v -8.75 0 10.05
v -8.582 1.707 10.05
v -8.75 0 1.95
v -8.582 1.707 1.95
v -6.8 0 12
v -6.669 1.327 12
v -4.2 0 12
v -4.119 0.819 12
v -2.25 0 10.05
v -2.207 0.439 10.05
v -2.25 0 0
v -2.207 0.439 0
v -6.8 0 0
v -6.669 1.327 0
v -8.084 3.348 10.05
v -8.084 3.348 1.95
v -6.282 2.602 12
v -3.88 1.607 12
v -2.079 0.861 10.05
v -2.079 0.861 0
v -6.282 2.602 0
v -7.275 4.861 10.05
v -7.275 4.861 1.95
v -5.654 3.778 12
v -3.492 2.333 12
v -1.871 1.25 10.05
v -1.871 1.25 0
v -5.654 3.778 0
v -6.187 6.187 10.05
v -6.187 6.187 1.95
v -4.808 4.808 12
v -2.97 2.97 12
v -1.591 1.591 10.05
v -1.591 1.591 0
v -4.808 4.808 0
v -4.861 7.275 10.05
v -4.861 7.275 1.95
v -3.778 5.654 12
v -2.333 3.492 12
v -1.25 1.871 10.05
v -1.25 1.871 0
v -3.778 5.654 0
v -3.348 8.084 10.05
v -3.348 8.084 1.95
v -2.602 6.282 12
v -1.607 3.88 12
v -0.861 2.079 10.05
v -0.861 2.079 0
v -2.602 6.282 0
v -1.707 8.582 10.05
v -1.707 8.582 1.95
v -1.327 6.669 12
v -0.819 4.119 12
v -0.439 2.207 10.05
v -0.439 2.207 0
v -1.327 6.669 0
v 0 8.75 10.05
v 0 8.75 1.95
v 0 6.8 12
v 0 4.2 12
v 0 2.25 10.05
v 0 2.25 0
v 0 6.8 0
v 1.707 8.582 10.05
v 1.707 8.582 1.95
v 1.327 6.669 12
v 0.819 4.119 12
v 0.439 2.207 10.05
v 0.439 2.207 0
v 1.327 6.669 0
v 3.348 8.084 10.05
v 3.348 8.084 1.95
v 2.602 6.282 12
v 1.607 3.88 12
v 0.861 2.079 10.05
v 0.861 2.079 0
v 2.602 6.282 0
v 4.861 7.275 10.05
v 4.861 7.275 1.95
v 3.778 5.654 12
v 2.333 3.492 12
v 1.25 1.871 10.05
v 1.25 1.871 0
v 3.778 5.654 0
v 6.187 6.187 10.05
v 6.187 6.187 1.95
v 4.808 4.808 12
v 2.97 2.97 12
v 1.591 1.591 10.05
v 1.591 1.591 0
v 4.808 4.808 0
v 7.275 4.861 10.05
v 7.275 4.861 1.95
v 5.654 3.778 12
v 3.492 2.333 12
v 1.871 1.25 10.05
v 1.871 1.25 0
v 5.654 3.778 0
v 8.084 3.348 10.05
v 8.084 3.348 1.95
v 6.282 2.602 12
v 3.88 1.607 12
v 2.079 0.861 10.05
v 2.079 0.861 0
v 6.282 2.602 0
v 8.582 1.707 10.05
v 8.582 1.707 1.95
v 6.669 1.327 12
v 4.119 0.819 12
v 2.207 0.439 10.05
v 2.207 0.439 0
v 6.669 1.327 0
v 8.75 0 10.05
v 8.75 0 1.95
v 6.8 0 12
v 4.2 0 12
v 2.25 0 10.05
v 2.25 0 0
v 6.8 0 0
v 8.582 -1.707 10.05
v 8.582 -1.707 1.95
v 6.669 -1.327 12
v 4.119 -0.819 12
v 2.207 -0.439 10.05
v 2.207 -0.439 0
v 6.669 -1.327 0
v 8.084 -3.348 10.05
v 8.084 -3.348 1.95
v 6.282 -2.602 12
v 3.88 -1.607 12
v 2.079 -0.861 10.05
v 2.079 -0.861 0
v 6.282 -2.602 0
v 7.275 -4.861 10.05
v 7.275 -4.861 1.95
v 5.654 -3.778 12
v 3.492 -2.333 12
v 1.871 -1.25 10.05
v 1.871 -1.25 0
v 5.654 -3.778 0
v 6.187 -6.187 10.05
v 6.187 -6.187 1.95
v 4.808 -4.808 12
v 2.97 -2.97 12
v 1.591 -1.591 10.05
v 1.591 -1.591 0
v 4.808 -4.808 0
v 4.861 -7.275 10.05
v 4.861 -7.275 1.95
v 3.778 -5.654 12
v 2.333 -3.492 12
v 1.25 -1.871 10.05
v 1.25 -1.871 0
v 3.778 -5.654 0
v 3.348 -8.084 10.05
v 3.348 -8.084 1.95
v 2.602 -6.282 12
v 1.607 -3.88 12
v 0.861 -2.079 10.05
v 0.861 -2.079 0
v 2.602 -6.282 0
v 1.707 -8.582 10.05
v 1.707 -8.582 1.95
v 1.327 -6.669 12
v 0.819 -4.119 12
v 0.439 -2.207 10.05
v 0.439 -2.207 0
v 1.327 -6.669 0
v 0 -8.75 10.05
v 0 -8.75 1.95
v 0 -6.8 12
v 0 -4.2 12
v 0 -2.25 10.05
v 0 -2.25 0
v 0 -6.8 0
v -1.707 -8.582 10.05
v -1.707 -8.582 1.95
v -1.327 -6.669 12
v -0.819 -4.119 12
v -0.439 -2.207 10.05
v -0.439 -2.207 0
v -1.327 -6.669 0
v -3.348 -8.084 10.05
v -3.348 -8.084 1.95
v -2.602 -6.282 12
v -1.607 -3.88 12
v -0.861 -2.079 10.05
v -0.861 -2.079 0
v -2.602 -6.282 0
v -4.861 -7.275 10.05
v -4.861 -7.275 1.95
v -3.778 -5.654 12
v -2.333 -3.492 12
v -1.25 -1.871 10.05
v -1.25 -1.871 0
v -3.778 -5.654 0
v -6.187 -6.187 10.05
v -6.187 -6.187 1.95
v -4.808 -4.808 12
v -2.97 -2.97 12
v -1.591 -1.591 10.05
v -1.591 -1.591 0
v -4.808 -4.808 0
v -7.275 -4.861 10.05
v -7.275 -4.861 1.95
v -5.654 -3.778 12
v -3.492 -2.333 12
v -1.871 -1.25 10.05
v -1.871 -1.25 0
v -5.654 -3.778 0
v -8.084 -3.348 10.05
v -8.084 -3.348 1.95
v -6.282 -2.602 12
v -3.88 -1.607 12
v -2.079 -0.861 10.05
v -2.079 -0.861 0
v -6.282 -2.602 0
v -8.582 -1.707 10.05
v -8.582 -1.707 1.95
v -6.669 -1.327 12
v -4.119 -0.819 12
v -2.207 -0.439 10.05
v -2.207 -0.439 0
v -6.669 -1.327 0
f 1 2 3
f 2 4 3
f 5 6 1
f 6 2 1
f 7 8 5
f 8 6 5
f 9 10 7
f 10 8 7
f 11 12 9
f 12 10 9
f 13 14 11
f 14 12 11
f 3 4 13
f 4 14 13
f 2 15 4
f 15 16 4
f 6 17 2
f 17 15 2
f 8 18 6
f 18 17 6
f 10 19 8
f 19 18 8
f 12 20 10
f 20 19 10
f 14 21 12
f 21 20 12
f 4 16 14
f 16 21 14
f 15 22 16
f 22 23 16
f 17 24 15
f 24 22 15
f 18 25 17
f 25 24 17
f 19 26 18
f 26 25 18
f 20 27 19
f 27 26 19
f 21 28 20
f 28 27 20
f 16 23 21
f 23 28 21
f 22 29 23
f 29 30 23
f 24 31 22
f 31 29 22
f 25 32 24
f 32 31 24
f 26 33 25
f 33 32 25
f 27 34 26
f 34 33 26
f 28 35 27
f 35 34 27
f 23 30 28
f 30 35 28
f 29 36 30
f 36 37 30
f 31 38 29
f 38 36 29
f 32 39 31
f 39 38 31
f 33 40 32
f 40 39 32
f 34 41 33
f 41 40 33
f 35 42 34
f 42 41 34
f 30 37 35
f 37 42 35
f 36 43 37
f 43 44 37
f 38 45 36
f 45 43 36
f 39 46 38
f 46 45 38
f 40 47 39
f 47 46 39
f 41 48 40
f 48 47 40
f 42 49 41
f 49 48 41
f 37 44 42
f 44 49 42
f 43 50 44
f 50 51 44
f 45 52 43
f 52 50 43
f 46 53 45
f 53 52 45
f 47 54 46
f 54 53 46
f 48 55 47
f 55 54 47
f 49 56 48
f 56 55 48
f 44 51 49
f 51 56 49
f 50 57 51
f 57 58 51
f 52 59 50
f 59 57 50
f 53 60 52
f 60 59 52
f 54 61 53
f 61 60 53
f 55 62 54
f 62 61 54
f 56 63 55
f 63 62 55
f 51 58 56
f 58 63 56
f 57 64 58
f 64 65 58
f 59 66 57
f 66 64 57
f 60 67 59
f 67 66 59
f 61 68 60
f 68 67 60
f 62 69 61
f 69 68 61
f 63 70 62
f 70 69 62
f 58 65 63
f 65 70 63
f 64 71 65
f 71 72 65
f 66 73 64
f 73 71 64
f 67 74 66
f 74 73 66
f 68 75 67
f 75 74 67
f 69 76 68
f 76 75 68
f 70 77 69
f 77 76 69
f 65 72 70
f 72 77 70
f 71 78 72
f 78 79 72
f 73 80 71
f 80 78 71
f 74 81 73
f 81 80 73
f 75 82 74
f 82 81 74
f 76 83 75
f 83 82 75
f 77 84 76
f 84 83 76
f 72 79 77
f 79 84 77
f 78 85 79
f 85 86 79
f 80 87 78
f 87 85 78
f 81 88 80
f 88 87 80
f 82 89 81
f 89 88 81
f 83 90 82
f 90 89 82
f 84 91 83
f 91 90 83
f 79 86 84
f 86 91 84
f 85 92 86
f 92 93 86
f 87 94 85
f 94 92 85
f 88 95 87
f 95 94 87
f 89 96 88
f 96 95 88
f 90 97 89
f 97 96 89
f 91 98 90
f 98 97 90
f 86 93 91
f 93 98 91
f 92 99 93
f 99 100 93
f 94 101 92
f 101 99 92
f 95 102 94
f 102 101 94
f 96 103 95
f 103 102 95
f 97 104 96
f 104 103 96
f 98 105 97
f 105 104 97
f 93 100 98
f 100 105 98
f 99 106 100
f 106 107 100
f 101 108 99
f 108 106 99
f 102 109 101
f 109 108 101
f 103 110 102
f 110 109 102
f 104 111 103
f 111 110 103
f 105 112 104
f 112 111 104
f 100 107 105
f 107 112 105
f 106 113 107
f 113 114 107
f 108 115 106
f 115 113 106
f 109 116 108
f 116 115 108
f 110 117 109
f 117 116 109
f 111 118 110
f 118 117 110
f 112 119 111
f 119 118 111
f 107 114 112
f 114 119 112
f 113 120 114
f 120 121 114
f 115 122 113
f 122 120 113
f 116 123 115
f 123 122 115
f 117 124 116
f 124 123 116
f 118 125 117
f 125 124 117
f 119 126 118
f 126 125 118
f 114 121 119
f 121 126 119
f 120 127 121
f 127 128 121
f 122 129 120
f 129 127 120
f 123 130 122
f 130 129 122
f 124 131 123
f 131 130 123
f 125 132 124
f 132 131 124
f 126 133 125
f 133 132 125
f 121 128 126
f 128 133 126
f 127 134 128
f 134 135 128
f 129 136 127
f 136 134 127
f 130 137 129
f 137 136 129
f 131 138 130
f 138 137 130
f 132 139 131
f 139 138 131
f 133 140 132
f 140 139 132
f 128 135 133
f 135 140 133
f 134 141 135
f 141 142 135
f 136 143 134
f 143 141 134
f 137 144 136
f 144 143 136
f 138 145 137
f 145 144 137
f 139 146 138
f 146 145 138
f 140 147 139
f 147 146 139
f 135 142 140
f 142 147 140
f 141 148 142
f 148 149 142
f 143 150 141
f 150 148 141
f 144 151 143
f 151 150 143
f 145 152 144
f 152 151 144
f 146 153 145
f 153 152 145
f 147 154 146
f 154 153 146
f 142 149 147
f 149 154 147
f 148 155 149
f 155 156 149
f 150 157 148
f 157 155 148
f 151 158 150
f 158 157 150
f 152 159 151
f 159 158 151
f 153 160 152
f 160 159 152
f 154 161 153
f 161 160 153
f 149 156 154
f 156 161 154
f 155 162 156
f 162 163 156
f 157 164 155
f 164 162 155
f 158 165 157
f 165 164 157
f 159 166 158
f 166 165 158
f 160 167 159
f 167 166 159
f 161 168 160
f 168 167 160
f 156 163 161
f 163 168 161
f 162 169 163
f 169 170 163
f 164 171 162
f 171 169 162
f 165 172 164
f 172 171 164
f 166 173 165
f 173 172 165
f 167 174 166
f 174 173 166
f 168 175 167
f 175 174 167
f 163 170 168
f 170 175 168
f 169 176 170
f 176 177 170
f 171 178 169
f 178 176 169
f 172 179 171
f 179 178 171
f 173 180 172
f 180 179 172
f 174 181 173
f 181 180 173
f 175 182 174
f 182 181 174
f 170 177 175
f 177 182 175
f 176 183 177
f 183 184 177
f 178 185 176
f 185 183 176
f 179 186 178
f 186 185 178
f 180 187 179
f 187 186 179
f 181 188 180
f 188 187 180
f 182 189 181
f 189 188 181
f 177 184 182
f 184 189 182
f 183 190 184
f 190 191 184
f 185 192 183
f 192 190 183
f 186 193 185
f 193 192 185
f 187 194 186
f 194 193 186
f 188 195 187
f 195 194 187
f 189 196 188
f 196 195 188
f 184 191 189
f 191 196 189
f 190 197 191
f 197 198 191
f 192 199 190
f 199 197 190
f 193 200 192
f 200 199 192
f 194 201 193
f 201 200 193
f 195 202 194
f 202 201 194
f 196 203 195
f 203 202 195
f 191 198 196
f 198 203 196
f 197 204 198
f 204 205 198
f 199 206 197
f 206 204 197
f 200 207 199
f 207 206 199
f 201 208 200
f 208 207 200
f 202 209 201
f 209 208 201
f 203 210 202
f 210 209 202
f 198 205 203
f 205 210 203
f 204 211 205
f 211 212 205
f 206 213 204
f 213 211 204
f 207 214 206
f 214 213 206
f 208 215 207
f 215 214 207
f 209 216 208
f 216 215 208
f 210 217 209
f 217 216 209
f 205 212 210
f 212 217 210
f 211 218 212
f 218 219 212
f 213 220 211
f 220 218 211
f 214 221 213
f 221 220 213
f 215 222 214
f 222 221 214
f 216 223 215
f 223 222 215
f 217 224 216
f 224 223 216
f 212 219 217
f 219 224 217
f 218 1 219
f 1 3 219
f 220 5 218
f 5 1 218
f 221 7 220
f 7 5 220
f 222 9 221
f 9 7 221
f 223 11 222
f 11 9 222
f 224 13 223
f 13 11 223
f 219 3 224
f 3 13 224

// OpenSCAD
$fn = 32;

// ----------------------------------------------------------------------
// Form washer: chamfered washer, 17.5 mm outside, 4.5 mm bore
// ----------------------------------------------------------------------

// --- parameters (mm) ---
revolve_angle = 360;      // full turn around the Z axis
profile_points = 7;       // points of the closed outline

profile = [[2.25, 0], [6.8, 0], [8.75, 1.95], [8.75, 10.05], [6.8, 12], [4.2, 12], [2.25, 10.05]];  // single closed polygon, 7 points, counter clockwise

// --- the one profile operation ---
rotate_extrude(angle = revolve_angle) polygon(points = profile);
